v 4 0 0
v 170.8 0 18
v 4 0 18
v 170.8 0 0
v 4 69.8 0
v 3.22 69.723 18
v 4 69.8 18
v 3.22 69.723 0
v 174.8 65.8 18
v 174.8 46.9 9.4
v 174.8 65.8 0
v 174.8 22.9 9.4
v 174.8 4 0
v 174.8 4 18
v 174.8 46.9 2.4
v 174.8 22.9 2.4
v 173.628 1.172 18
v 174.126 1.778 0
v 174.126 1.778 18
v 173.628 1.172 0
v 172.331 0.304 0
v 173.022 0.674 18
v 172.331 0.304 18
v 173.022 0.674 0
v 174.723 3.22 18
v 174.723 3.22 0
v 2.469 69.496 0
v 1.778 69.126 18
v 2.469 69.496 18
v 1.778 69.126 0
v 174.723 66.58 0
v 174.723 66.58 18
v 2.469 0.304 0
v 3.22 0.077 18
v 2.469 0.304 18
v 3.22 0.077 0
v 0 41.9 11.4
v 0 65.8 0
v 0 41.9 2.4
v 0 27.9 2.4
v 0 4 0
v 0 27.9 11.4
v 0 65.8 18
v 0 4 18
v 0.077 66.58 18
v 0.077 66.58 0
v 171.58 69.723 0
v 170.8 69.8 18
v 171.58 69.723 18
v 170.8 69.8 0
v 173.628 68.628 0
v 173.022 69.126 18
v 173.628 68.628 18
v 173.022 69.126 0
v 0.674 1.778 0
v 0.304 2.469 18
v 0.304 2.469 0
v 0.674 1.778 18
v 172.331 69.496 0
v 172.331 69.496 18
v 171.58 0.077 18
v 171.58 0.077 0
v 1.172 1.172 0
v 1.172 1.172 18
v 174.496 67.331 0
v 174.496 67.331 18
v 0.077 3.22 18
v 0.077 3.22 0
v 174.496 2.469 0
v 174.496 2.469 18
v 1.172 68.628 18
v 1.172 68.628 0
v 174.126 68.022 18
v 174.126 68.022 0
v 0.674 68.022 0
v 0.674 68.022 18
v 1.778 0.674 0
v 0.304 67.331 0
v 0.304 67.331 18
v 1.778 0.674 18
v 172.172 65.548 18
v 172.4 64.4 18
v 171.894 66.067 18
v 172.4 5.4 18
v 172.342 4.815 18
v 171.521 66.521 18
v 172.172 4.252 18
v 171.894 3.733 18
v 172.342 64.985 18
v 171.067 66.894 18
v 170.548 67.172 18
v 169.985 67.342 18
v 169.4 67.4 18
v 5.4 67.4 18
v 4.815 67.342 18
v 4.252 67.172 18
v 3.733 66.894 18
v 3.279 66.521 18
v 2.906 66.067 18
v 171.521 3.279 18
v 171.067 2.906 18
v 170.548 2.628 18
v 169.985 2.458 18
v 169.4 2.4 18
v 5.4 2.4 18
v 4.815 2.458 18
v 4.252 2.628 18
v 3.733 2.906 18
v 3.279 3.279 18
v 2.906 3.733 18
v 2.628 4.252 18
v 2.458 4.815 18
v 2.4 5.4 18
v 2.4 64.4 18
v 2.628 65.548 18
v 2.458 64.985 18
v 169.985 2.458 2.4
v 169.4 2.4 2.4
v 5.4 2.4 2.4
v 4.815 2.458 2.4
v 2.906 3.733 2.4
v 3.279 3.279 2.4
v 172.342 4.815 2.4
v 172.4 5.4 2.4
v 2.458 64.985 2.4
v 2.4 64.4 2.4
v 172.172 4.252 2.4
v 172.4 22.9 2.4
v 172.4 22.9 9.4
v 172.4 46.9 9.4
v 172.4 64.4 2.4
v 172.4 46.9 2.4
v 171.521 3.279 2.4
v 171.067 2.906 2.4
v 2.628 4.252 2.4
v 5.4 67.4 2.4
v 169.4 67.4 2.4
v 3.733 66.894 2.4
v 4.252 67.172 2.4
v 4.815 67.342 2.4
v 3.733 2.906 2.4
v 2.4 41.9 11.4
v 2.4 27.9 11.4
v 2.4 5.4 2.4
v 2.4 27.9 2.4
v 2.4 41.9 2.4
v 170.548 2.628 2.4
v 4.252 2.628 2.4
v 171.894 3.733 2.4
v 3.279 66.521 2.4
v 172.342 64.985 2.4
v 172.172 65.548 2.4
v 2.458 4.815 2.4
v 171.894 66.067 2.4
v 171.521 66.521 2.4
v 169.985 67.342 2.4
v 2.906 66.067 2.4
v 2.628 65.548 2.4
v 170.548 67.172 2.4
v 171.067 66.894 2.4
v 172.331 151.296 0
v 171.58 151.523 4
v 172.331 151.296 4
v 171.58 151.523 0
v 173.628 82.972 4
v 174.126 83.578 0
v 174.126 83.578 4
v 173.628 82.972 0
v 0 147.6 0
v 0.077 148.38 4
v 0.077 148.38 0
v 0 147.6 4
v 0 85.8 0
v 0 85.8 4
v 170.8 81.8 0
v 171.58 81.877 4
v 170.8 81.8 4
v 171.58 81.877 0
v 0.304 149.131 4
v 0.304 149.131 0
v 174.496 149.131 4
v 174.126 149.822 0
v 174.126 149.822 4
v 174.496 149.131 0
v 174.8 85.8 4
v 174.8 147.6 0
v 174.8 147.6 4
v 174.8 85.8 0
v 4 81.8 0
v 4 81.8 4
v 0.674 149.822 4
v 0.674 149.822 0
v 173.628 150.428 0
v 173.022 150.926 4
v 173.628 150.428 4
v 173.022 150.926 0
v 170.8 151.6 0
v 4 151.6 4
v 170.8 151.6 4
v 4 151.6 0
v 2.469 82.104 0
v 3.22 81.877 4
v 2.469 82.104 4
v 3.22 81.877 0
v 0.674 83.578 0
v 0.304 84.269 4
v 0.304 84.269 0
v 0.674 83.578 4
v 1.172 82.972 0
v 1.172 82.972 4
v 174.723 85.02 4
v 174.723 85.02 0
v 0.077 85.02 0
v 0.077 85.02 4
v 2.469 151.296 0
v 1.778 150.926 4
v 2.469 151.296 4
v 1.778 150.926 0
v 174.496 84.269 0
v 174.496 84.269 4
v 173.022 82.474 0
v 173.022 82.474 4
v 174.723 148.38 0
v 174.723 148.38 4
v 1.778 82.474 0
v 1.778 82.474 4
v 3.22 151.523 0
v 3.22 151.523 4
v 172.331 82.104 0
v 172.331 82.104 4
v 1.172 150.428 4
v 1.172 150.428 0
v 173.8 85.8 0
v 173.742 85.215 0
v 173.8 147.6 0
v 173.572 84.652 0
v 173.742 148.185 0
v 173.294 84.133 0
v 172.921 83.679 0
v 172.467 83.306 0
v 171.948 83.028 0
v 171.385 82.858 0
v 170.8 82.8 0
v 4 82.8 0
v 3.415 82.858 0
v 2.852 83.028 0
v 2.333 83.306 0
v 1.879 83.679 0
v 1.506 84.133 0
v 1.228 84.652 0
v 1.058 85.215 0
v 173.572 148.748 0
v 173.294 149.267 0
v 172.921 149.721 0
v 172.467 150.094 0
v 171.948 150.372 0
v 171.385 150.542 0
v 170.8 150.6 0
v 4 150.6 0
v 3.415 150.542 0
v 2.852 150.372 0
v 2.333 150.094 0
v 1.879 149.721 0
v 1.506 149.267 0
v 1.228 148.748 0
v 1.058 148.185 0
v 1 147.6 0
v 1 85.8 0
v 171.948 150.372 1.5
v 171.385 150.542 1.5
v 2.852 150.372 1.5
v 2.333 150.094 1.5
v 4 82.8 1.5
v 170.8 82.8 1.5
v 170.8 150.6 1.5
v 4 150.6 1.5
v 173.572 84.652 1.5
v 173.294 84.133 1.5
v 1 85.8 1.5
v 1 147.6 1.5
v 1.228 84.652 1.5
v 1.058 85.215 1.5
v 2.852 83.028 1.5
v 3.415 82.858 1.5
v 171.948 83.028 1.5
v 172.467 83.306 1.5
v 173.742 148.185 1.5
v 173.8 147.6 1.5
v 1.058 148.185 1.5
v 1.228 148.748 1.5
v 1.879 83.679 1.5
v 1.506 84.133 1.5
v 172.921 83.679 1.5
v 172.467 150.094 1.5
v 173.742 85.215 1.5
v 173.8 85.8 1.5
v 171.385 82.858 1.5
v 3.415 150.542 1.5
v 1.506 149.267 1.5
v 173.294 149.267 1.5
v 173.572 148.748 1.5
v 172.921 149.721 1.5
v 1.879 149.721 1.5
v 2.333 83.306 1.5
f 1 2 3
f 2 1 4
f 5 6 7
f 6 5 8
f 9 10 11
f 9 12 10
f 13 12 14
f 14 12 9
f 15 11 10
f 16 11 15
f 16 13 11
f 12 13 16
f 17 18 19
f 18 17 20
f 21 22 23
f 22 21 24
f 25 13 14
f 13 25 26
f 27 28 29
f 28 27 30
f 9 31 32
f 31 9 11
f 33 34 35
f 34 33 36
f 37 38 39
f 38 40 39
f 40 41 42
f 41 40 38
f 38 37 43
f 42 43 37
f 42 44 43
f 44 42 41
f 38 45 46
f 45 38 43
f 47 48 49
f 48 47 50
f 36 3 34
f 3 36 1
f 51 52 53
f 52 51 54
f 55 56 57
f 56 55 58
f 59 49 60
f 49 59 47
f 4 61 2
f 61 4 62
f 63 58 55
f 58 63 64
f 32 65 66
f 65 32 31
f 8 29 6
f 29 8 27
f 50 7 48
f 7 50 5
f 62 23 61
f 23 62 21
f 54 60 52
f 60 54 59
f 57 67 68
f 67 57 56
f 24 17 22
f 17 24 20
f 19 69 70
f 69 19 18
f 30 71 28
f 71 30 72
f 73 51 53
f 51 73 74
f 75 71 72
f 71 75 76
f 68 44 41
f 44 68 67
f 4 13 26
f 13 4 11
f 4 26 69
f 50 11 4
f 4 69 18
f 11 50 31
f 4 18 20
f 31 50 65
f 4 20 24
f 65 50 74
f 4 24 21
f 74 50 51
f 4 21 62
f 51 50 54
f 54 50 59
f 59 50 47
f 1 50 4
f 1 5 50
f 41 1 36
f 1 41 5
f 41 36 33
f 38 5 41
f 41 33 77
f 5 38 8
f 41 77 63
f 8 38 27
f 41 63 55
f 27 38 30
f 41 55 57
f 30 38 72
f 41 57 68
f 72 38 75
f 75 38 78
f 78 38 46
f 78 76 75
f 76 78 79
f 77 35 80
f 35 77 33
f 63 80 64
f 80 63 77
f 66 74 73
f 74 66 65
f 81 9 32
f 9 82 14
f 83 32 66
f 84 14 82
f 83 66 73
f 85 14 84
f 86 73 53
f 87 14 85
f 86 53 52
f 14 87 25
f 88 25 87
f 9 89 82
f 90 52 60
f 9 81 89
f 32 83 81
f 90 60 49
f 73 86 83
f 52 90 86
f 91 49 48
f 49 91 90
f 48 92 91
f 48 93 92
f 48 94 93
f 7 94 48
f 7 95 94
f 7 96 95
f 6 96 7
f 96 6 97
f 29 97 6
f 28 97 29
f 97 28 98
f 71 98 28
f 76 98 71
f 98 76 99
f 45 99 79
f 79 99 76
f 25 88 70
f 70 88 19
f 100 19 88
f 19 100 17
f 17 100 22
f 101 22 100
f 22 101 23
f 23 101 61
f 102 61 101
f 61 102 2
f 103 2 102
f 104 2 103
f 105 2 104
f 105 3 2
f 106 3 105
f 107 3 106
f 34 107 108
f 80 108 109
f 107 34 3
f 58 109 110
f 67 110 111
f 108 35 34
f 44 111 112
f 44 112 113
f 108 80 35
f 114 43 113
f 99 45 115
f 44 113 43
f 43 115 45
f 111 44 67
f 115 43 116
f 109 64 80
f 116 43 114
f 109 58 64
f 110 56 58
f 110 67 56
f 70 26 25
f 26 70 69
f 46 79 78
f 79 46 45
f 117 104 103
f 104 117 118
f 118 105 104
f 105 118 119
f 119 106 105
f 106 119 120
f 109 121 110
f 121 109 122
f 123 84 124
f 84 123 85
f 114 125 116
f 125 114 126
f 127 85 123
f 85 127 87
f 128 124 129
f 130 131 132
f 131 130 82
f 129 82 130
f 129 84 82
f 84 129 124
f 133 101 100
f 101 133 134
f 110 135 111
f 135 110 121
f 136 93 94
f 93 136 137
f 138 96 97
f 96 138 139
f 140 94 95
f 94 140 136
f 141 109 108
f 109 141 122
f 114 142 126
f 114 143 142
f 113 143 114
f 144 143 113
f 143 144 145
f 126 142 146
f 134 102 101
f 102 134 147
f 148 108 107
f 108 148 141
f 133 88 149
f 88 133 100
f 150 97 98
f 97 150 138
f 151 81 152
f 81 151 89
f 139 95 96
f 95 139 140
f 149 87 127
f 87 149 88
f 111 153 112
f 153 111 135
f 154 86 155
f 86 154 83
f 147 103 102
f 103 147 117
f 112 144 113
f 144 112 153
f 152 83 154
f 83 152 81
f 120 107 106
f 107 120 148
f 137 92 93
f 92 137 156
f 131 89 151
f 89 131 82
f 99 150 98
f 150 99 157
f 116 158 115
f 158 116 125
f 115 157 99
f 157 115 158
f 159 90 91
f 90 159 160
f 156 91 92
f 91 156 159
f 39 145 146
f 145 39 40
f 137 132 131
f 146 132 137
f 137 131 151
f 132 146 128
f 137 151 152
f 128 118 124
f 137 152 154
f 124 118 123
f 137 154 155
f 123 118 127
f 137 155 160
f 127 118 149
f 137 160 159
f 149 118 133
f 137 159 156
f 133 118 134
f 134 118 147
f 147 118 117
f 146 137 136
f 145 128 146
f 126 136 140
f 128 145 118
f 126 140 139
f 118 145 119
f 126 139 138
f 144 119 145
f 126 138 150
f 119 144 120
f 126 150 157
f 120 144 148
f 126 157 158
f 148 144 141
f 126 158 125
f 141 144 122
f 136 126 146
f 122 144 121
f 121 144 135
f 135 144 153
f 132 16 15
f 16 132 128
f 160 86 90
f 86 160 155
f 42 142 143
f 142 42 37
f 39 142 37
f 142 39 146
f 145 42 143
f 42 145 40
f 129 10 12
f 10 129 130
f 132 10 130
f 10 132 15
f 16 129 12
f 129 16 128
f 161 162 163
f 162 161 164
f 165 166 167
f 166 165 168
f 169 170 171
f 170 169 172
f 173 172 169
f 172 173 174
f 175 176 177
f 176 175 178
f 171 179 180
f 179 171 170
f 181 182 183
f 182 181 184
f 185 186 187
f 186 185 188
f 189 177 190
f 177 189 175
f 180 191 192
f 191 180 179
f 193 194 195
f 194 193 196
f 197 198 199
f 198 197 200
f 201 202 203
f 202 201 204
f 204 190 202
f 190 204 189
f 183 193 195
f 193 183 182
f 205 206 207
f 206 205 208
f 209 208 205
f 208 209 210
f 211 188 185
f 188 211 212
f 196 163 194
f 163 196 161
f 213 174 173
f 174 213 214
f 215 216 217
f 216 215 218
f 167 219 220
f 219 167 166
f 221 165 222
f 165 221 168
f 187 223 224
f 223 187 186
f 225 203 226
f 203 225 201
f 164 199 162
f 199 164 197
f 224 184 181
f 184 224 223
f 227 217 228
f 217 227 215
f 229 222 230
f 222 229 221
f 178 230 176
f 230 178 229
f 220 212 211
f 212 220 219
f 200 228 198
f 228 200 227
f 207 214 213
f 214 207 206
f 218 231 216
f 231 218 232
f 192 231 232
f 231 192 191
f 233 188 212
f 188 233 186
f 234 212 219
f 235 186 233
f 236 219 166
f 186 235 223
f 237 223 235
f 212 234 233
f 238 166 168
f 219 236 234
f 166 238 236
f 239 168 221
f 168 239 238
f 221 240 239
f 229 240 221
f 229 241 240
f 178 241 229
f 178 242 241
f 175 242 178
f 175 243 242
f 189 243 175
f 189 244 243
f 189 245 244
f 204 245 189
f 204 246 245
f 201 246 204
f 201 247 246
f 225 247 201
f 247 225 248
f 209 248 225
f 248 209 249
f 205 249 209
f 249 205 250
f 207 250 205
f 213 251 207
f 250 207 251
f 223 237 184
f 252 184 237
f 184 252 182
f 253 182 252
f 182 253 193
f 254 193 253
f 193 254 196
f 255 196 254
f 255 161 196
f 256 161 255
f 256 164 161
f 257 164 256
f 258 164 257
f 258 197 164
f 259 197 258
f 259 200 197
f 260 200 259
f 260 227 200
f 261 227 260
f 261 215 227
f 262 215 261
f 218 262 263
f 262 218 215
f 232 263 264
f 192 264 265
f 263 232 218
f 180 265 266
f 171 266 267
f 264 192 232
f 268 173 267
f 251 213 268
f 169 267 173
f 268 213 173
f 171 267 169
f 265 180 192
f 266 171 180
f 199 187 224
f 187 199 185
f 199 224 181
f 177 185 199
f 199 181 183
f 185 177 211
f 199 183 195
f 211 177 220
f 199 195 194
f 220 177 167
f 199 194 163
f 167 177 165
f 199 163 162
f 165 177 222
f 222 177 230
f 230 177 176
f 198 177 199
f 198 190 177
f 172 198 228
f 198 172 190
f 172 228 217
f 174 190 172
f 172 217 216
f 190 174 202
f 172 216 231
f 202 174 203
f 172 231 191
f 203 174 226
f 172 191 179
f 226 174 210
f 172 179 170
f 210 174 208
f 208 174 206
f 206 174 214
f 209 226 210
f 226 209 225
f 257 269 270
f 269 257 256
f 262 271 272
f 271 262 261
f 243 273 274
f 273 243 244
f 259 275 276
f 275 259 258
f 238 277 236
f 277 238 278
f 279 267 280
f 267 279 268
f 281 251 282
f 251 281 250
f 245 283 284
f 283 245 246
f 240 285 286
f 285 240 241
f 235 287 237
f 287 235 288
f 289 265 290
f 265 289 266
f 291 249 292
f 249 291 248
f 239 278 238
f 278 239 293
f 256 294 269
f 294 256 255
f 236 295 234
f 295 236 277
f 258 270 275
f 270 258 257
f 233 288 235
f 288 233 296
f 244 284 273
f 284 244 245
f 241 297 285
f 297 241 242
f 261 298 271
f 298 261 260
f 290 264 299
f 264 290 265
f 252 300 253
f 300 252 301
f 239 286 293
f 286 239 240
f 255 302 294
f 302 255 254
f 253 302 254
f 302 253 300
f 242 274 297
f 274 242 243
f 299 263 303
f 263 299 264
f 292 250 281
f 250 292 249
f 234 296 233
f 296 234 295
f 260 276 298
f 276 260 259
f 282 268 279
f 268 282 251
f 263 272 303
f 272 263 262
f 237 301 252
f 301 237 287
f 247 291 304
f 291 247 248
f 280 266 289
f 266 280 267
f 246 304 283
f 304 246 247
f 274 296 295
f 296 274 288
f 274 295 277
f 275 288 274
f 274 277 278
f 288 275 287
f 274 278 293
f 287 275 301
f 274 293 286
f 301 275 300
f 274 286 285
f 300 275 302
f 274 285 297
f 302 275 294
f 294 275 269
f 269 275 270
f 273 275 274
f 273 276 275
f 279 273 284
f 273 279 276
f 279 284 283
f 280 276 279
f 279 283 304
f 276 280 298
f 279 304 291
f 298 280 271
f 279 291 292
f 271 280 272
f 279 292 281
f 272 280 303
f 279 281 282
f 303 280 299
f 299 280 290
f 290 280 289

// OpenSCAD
// Lowveld Grove — Electronics enclosure (base + lid)
//
// A project box for the Uno/ESP32 + breadboard rig. The whole point is to
// stop wires from being disturbed by hand contact — which has been the
// single biggest source of the flaky/intermittent sensor readings during
// testing. Boxing the wiring in reduces exactly that risk.
//
// IMPORTANT: measure your actual breadboard/board footprint before
// printing — the numbers below are reasonable guesses for a standard
// full-size breadboard, not measurements of your specific hardware. Open
// this in OpenSCAD (openscad.org, free), adjust the parameters, preview
// with F5, render with F6, then File > Export > Export as STL.
//
// Prints as two separate parts (base and lid) laid out side by side —
// slice and print both.

// ---- Parameters (mm) — measure and adjust these ----
board_length = 170;      // breadboard length
board_width  = 65;       // breadboard width
board_height = 12;       // clearance above the board for the tallest component (e.g. the servo horn or relay)
wall = 2.4;              // wall thickness — 2-2.5mm is a good default for most printers
lid_lip = 1.4;           // how far the lid's inner lip overlaps the base wall (fit tolerance)
usb_notch_width = 14;
usb_notch_height = 9;
wire_notch_width = 24;
wire_notch_height = 7;
corner_radius = 4;

base_height = board_height + 6; // extra clearance for wires routed underneath/beside the board

module rounded_box(l, w, h, r) {
  hull() {
    for (x = [r, l - r])
      for (y = [r, w - r])
        translate([x, y, 0])
          cylinder(h = h, r = r, $fn = 32);
  }
}

module base() {
  difference() {
    rounded_box(board_length + 2 * wall, board_width + 2 * wall, base_height, corner_radius);

    // hollow interior
    translate([wall, wall, wall])
      rounded_box(board_length, board_width, base_height, corner_radius - 1);

    // USB cable notch — one side wall, for programming/power without opening the box
    translate([-1, board_width / 2 - usb_notch_width / 2 + wall, wall])
      cube([wall + 2, usb_notch_width, usb_notch_height]);

    // Sensor/servo/relay wire notch — opposite side wall
    translate([board_length + wall - 1, board_width / 2 - wire_notch_width / 2 + wall, wall])
      cube([wall + 2, wire_notch_width, wire_notch_height]);
  }
}

module lid() {
  lid_height = 4;
  difference() {
    rounded_box(board_length + 2 * wall, board_width + 2 * wall, lid_height, corner_radius);
    translate([wall - lid_lip, wall - lid_lip, -1])
      rounded_box(
        board_length + 2 * lid_lip,
        board_width + 2 * lid_lip,
        lid_height - 1.5,
        corner_radius - 1
      );
  }
}

base();
translate([0, board_width + 2 * wall + 12, 0]) lid();
